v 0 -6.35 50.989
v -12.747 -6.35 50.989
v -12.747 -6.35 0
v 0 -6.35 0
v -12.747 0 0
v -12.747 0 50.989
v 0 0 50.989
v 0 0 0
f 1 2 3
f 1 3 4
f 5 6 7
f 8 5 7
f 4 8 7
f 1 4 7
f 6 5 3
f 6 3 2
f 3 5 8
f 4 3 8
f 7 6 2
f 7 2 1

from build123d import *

# Parameters (mm, degrees)
F0_W     = 25.4947114736
F0_H     = 43.1240350008
F1_DEPTH = 25.4
F2_T     = -2.54
F4_W     = 12.7473566681
F4_H     = 50.9894266725
F5_DEPTH = 6.35


with BuildPart() as f1:
    # F0 (on Front) → F1 (new body)
    with BuildSketch(Plane.XZ):
        with Locations((12.7473557368, 21.5620175004)):
            Rectangle(F0_W, F0_H)
    extrude(amount=F1_DEPTH)

    # F2
    f2_openings = [f1.faces().sort_by_distance(p)[0] for p in [
        (12.747356, -12.7, 43.124035),
    ]]
    offset(amount=F2_T, openings=f2_openings)


with BuildPart() as f5:
    # F4 (on Front) → F5 (new body)
    with BuildSketch(Plane.XZ):
        with Locations((-6.3736783341, 25.4947133362)):
            Rectangle(F4_W, F4_H)
    extrude(amount=F5_DEPTH)


solid = f5.part
